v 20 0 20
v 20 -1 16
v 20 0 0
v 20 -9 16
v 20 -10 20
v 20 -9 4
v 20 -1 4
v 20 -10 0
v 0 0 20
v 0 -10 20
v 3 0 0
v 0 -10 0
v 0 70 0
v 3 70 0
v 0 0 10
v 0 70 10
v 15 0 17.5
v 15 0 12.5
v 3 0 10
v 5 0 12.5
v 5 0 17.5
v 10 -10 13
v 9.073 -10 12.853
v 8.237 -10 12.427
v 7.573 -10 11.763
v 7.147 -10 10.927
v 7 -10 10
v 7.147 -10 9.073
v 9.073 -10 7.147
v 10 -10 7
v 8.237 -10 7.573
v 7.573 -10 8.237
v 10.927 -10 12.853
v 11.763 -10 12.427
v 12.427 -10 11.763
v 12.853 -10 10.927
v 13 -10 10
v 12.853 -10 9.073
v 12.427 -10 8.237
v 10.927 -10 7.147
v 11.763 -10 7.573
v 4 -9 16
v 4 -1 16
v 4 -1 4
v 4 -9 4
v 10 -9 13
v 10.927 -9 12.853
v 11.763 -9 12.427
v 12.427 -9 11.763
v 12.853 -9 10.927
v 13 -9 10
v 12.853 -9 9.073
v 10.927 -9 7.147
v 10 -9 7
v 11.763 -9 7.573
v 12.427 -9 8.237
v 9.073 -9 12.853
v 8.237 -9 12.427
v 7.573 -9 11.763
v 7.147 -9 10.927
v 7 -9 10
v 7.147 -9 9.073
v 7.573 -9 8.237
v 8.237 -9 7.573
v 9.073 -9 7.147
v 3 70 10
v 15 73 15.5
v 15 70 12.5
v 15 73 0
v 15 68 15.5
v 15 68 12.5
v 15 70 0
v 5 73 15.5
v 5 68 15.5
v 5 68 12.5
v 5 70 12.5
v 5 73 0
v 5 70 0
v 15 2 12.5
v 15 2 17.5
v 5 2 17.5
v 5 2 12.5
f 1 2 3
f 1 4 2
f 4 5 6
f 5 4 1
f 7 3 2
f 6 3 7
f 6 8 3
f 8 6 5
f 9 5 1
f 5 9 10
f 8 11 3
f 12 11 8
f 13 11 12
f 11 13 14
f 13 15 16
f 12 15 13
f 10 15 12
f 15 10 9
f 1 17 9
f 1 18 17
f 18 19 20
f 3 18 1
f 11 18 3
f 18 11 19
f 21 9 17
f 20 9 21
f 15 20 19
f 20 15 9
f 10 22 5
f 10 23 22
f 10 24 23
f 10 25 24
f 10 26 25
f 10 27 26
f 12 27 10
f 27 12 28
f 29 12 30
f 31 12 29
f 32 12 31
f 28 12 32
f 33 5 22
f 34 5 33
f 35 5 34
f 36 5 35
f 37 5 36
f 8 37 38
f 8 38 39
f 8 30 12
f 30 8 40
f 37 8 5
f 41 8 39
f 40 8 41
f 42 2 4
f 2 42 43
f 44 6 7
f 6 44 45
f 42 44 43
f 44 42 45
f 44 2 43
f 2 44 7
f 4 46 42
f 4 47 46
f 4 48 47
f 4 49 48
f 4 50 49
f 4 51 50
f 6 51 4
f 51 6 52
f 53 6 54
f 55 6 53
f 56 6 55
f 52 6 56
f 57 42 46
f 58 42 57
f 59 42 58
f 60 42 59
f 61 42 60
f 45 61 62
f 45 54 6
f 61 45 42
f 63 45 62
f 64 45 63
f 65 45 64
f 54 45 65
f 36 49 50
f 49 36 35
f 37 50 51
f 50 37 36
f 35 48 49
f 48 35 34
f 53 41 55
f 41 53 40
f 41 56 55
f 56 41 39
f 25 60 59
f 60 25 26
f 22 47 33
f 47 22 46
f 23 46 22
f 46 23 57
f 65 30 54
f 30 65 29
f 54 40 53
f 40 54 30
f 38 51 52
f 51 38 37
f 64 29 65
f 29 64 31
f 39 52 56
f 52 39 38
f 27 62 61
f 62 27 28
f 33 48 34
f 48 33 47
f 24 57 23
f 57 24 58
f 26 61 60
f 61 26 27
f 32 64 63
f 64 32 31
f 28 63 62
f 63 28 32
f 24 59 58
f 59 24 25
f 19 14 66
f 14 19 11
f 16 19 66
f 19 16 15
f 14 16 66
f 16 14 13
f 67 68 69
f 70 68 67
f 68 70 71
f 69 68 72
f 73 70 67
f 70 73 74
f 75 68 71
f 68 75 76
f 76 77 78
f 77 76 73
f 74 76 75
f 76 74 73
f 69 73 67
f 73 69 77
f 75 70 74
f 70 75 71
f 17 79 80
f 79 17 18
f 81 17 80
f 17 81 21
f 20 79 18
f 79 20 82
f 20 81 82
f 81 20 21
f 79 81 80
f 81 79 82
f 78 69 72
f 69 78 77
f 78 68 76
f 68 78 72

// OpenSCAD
//-------------------------------------------------------------
// Edit these two variables, according to your phone
//-------------------------------------------------------------
phone_width = 70;
phone_depth = 9.5;

//-------------------------------------------------------------

// The support base is a simple longe rectangle
translate([0,0,0])
cube ([3, phone_width, 10]);

// upper winglet, to hold the phone
translate([5, phone_width - 2, phone_depth + 3])
cube ([10, 5, 3]);

// lower winglet, to hold the phone
translate([5, 0, phone_depth + 3])
cube ([10, 2, 5]);    

// the piece connecting the support base to the winglet
translate([5, phone_width, 0])
cube ([10, 3, phone_depth + 3]);

nut_holder(10);

module nut_holder(box_height)
{
    //draw the nut holder:
    // This is a box rotated 90deg around X
    translate([0, -box_height, 0]) {
        box_side = 20;        
        nut_width = 12; /* measured xy when nut is on a table */
        nut_height = 8; /* measured z when nut is on a table */
            
        center = (box_side - nut_width) / 2;
        
        //translate([center, -3, center])
        //cube ([nut_width, 1, nut_width]);
        
        difference() {        
            // A box for the nut holder
            cube ([box_side, box_height, box_side]);
            
            // A rectangular hole, inside the box,
            // where we can put the nut
            translate([center, 1, center])
            cube ([box_side, nut_height, nut_width]);
            
            // A hole, thorugh that box, so we can insert the screw
            rotate([90, 0, 0])
            translate([box_side / 2, box_side / 2, -2])        
            cylinder(r1=3, r2=3, h=3, $fn=20);
        }
    }
}
